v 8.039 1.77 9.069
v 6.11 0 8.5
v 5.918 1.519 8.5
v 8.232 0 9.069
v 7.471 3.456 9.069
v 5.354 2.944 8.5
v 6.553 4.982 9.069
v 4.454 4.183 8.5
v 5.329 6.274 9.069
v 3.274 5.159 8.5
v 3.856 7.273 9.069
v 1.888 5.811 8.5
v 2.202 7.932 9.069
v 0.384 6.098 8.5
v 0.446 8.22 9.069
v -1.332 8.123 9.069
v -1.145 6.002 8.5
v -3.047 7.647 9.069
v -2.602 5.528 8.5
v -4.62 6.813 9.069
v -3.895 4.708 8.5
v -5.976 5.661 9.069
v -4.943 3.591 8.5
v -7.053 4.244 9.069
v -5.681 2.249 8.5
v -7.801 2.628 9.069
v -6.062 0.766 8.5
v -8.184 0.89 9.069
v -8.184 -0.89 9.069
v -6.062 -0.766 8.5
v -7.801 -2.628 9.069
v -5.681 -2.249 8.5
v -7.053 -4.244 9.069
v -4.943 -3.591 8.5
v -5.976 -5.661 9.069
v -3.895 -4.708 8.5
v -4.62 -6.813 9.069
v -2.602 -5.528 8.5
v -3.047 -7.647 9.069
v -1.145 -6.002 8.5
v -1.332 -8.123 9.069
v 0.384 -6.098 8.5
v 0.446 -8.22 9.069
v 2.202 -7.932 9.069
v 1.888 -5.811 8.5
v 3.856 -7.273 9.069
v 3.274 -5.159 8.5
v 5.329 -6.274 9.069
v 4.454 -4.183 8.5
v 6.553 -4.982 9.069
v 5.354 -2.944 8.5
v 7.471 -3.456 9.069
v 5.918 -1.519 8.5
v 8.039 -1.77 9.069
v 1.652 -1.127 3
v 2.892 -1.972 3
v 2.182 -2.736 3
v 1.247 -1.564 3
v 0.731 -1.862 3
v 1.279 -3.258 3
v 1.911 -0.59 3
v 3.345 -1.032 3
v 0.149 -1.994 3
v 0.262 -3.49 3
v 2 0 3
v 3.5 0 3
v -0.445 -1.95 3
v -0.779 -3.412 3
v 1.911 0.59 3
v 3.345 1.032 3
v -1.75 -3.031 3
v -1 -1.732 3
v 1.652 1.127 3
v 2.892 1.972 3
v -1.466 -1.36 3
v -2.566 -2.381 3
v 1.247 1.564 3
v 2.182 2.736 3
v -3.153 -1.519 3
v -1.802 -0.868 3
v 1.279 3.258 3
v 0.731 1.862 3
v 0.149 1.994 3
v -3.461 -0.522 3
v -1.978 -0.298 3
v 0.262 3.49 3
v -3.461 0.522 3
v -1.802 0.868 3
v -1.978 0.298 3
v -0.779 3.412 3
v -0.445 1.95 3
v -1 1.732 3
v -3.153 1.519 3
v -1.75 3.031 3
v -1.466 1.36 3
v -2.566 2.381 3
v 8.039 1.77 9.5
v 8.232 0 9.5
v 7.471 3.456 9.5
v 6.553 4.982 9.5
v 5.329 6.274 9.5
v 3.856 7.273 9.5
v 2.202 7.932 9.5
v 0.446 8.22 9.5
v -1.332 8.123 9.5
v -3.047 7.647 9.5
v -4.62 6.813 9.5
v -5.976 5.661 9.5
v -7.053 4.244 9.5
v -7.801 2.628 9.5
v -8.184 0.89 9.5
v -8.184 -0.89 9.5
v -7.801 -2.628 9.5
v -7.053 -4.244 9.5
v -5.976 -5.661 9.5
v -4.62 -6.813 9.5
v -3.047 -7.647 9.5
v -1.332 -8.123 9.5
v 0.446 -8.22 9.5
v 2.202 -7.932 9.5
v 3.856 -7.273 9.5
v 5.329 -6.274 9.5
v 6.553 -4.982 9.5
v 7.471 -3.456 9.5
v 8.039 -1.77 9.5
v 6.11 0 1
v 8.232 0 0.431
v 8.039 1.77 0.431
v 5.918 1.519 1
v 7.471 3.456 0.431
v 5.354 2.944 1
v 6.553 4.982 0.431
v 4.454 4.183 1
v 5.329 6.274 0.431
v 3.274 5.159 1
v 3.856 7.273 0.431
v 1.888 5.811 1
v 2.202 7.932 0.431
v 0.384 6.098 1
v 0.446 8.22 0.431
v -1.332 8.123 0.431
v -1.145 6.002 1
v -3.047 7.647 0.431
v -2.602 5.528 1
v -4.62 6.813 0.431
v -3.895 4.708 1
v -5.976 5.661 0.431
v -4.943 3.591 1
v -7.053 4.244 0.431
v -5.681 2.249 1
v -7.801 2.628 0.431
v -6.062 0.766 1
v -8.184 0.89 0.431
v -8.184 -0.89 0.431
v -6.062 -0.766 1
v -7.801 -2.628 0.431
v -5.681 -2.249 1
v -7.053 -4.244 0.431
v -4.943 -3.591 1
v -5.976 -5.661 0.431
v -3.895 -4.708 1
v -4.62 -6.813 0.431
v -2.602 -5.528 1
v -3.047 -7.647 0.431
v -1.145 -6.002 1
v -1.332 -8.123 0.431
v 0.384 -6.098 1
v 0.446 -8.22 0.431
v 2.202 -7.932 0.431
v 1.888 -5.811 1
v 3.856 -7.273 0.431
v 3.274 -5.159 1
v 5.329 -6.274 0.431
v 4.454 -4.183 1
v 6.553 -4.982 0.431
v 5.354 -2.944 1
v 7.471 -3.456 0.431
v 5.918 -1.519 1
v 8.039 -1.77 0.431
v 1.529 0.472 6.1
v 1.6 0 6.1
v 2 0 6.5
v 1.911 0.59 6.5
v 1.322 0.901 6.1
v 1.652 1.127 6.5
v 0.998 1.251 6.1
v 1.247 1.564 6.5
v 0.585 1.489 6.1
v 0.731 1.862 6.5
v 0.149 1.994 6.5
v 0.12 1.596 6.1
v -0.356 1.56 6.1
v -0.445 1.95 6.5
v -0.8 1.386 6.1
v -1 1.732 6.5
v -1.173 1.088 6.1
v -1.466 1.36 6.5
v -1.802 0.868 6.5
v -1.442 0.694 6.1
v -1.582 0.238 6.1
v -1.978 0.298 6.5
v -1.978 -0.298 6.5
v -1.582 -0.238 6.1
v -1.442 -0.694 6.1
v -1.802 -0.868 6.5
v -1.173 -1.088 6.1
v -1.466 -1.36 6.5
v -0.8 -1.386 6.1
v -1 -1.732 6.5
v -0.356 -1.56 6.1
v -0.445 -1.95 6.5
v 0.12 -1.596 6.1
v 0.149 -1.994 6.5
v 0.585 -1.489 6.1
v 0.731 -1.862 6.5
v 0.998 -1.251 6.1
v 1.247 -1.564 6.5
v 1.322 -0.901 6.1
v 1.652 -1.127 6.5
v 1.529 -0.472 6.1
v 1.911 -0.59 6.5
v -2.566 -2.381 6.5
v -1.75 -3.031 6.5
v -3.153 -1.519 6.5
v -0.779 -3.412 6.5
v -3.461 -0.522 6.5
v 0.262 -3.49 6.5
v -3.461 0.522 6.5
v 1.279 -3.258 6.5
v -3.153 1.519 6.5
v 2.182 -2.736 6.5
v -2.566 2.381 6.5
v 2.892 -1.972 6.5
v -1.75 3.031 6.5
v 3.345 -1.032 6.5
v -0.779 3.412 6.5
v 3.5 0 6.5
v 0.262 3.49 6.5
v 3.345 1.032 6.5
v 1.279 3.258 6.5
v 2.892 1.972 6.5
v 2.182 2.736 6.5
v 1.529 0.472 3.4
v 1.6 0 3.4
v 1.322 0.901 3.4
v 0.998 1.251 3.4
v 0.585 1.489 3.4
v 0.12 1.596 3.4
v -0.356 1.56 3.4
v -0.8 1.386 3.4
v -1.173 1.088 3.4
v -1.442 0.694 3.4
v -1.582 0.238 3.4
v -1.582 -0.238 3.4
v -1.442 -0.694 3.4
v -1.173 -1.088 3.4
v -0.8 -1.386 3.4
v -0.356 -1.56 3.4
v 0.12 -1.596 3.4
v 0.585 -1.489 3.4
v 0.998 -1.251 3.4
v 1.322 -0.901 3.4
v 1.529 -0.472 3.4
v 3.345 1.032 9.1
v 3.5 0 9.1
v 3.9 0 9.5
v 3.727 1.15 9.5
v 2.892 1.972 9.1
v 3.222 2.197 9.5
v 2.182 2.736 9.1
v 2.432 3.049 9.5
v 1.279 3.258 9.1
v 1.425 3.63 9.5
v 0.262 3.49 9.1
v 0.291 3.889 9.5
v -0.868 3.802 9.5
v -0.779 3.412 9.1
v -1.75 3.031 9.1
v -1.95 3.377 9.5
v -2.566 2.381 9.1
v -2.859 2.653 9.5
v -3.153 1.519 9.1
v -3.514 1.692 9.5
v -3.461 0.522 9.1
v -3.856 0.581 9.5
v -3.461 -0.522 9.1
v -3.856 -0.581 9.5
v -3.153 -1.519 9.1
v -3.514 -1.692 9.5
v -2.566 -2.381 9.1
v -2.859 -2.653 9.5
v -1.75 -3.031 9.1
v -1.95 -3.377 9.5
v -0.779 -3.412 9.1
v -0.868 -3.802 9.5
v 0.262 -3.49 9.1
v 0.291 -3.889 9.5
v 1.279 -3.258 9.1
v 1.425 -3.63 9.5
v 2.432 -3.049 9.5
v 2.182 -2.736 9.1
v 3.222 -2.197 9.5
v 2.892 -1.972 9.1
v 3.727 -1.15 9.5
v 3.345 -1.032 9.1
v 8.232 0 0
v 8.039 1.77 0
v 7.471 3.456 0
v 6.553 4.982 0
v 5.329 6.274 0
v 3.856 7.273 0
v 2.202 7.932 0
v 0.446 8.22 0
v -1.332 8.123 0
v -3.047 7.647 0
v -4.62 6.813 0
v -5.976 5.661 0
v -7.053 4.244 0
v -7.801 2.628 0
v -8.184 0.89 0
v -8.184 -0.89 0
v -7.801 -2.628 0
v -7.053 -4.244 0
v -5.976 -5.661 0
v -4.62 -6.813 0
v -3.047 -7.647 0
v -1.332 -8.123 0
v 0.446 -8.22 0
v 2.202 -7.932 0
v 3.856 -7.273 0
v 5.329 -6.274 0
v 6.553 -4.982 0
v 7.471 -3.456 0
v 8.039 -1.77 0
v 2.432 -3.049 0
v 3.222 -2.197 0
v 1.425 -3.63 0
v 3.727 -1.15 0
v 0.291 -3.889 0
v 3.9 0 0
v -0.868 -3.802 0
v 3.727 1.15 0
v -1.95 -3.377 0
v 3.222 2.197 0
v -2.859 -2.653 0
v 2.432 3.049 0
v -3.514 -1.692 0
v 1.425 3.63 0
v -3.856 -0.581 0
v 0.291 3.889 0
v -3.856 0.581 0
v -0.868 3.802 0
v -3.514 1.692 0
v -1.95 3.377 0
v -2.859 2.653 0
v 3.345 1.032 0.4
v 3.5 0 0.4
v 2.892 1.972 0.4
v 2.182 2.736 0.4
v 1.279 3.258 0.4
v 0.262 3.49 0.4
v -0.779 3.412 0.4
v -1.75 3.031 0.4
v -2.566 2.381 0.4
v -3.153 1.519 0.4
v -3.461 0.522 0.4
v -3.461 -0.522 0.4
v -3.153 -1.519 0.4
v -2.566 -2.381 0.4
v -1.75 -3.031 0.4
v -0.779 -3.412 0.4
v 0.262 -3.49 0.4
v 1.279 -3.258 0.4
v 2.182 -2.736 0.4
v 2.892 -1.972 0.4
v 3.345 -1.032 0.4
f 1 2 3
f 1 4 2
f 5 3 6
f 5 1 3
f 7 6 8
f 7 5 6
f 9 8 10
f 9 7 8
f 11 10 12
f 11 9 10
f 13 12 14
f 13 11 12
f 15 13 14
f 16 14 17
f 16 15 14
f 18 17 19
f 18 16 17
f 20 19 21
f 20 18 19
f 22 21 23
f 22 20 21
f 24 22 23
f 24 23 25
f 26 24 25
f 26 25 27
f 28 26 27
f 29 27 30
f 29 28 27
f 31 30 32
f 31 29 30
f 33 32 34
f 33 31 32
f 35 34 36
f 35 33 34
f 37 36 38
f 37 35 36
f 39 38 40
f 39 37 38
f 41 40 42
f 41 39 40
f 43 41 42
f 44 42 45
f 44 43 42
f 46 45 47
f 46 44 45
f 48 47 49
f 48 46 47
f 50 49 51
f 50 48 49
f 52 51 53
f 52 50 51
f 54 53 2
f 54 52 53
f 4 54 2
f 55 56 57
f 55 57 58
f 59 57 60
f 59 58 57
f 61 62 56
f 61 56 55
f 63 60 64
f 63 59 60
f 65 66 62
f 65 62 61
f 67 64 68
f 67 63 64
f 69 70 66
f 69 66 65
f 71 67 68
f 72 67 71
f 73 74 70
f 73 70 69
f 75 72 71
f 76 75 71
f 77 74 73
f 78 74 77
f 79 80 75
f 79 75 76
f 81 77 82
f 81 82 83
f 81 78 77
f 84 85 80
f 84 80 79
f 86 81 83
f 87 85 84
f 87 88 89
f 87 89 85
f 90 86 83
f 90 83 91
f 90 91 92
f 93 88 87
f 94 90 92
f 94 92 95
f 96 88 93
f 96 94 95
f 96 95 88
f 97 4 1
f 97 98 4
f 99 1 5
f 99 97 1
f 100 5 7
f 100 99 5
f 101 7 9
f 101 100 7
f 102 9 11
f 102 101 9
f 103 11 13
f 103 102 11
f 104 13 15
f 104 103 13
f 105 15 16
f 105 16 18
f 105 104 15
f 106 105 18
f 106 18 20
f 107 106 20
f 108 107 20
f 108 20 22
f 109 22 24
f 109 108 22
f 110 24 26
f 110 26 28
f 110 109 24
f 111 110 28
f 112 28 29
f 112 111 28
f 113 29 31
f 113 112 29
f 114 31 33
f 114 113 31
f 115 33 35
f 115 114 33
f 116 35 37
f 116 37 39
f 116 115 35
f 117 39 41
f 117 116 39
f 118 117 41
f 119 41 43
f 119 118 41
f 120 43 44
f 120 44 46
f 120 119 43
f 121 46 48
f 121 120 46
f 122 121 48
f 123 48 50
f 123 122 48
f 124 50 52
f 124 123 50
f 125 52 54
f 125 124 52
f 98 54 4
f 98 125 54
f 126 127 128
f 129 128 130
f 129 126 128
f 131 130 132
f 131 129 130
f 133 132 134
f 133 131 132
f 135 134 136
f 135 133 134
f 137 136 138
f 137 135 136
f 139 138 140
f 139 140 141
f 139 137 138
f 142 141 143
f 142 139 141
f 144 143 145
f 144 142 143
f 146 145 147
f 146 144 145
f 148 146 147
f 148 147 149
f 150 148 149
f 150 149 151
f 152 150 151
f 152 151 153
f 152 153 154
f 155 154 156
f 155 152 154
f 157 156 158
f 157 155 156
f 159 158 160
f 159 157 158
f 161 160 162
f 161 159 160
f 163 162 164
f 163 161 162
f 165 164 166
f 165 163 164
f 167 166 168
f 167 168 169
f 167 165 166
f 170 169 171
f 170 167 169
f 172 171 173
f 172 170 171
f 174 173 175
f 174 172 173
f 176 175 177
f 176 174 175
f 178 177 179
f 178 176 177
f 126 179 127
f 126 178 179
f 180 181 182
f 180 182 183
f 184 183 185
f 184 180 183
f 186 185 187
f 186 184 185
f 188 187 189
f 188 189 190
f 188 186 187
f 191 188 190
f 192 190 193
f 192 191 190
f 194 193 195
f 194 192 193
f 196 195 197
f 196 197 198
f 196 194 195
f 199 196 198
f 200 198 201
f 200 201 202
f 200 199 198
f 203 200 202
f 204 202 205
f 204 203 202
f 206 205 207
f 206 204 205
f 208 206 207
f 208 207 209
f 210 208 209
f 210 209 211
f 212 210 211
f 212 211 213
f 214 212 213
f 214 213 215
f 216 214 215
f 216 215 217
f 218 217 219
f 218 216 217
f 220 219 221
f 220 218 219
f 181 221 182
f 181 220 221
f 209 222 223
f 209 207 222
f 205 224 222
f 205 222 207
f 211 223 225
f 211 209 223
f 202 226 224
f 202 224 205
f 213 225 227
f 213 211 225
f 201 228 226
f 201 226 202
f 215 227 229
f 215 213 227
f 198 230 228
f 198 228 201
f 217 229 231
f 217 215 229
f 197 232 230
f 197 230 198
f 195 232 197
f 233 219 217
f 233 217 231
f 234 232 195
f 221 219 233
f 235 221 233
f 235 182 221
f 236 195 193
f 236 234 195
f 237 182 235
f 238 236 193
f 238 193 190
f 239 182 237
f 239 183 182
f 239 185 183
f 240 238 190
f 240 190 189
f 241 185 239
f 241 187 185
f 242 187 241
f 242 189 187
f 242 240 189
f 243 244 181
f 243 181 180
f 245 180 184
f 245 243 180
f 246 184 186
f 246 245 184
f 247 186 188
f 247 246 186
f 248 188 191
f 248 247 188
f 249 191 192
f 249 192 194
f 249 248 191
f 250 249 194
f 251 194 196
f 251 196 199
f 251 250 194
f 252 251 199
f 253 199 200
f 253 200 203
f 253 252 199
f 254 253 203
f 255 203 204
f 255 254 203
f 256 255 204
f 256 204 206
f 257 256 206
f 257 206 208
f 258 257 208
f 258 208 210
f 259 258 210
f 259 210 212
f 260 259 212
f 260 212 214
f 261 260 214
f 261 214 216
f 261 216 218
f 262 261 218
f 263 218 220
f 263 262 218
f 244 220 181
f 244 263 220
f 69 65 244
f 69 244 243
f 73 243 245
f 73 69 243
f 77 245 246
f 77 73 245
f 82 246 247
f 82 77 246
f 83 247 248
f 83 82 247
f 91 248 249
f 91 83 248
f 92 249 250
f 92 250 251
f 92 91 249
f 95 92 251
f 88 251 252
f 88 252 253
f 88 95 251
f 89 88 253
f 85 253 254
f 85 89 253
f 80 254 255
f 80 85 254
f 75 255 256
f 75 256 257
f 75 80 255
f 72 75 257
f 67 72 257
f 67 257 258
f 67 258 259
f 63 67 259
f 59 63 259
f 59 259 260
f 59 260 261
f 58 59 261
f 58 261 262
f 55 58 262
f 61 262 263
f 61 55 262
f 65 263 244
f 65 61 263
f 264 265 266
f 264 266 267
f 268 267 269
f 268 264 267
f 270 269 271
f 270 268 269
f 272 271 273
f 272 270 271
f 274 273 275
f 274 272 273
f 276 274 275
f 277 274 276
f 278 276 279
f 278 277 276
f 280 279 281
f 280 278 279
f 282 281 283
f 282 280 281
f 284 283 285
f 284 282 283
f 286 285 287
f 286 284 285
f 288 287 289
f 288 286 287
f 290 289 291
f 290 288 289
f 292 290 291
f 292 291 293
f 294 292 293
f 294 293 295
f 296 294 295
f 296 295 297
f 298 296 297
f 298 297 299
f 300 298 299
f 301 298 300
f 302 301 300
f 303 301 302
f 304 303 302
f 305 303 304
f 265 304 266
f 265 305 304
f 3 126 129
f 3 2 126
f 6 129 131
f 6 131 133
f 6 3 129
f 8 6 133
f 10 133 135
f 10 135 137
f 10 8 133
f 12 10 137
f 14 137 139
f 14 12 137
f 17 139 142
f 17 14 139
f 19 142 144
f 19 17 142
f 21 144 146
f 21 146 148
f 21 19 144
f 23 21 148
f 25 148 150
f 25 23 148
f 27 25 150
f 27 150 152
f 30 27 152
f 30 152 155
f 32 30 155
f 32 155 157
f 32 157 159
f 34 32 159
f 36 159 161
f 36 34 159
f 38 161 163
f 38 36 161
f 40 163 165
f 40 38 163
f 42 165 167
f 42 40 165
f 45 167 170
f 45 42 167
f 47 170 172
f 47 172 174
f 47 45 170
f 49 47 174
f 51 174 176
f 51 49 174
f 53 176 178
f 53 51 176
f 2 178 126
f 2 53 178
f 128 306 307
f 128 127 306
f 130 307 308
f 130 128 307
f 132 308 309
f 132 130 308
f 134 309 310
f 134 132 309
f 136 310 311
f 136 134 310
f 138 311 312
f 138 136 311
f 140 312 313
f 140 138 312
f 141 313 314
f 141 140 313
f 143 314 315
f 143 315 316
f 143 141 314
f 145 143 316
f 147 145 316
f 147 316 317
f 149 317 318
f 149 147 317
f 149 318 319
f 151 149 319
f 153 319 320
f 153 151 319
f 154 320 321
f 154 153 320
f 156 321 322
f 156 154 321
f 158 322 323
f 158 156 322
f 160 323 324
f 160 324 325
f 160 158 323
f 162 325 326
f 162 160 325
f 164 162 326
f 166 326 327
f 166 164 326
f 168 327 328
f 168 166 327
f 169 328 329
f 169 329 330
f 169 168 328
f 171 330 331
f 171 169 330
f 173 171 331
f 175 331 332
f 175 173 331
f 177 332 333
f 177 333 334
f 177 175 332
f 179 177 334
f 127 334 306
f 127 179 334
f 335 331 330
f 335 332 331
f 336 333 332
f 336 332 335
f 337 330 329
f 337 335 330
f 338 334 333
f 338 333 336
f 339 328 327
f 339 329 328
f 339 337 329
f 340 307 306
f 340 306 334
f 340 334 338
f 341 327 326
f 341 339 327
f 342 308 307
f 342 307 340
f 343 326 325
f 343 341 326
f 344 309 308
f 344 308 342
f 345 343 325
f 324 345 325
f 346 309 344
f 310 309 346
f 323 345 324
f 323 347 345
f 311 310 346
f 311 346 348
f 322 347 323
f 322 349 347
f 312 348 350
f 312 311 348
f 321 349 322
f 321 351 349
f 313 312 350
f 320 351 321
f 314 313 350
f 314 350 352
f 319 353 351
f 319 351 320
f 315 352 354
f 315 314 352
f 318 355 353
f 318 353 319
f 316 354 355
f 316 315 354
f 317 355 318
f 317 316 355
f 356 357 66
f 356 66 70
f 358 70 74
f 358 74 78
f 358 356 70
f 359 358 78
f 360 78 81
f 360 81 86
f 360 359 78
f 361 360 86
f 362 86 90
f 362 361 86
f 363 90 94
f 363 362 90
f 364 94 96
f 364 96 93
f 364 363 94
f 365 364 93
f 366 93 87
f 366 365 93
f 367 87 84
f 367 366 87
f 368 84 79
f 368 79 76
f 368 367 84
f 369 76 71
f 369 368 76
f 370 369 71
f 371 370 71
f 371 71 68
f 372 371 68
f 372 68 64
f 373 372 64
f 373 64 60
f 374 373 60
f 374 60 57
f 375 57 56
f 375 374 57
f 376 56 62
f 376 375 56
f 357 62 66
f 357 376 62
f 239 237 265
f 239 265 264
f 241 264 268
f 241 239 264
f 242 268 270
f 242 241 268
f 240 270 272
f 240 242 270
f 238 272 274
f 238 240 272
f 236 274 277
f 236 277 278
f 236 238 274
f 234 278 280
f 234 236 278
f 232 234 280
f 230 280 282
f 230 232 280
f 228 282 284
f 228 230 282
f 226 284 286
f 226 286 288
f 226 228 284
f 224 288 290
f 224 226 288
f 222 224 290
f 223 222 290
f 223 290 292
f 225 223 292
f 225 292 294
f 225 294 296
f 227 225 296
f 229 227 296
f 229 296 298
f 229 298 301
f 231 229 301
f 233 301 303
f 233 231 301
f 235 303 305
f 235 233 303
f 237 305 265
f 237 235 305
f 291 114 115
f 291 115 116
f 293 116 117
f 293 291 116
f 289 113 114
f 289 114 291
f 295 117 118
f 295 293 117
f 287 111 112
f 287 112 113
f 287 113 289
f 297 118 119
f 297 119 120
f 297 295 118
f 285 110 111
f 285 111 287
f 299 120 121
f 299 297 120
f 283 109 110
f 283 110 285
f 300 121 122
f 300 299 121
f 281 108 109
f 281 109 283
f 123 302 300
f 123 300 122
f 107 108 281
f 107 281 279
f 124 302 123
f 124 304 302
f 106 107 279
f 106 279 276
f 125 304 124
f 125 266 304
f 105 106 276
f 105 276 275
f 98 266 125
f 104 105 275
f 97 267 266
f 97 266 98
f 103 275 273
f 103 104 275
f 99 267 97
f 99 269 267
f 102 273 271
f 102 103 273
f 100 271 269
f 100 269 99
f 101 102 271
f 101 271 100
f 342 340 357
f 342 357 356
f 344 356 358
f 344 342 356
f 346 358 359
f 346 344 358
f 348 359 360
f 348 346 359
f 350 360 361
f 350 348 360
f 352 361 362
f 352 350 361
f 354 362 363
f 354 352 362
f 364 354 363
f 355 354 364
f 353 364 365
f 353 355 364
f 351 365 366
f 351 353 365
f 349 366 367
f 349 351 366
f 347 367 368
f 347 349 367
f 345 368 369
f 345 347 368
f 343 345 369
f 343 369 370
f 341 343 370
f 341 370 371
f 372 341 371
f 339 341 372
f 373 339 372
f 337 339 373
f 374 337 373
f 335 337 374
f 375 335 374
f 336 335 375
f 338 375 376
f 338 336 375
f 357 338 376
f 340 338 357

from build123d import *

# Parameters (mm, degrees)
F2_SIZE = 0.4


with BuildPart() as f1:
    # F0 (on Front) → F1 (revolve)
    with BuildSketch(Plane.XZ):
        Polygon((3.5, 3), (3.5, 0), (8.231808, 0), (8.231808, 0.431463), (6.11, 1), (6.11, 8.5), (8.231808, 9.068537), (8.231808, 9.5), (3.5, 9.5), (3.5, 6.5), (1.6, 6.5), (1.6, 3), align=None)
    revolve(axis=Axis((0, 0, 7.577015), (0, 0, 1)))

    # F2
    f2_edges = [f1.edges().sort_by_distance(p)[0] for p in [
        (-3.5, 0, 9.5),
        (-3.5, 0, 0),
        (-1.6, 0, 6.5),
        (-1.6, 0, 3),
        (1.6, 0, 4.75),
    ]]
    chamfer(f2_edges, length=F2_SIZE)


solid = f1.part
